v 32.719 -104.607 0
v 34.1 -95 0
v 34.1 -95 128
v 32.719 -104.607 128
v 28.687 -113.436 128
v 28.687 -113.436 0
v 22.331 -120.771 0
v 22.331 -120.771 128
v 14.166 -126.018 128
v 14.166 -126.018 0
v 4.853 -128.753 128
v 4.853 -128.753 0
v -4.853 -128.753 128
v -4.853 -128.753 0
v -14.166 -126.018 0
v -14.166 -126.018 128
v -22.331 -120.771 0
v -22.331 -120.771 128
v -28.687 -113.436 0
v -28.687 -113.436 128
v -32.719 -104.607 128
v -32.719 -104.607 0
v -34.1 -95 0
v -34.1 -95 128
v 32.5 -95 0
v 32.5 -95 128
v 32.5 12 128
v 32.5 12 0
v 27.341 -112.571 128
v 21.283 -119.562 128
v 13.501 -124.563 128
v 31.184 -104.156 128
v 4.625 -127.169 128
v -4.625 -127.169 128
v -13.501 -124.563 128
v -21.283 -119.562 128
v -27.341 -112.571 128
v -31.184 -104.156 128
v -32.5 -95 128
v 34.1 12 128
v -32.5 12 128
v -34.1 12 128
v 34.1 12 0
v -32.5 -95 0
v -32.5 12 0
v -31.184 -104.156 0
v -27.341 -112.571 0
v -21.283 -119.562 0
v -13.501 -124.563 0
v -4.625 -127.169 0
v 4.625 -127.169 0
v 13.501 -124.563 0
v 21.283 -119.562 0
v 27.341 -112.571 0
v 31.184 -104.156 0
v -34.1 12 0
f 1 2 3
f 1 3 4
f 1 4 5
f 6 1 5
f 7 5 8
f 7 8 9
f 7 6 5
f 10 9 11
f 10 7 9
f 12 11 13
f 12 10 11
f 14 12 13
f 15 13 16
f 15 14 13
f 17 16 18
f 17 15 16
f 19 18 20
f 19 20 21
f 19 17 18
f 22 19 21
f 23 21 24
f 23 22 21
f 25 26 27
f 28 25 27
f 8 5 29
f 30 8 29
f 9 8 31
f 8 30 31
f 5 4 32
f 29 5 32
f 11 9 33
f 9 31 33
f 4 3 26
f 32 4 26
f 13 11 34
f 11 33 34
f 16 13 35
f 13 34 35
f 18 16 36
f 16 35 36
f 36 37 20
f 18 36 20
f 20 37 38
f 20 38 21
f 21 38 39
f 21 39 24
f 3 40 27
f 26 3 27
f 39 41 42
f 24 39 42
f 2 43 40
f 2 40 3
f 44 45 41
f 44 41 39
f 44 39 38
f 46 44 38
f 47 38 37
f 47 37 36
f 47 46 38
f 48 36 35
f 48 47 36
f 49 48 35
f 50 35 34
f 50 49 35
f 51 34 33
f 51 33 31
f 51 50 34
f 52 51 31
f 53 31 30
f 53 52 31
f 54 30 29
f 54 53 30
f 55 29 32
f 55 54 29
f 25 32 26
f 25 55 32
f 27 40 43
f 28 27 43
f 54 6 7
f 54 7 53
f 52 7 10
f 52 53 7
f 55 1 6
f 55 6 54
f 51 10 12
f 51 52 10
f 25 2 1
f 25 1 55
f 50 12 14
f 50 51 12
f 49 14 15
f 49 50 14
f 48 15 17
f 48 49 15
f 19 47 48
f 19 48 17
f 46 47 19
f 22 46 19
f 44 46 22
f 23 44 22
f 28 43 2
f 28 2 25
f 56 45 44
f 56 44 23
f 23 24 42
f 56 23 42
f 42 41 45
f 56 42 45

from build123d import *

# Parameters (mm, degrees)
SKETCH1_R                = 14
BOSS_EXTRUDE1_DEPTH      = 6
M3_CLEARANCE_HOLE1_D     = 3.6
M3_CLEARANCE_HOLE1_DEPTH = 6
M3_CLEARANCE_HOLE1_TIP   = 1.081549114
FILLET1_R                = 15
SKETCH4_W                = 65
SKETCH4_H                = 9
CUT_EXTRUDE1_DEPTH       = 2
M4_CLEARANCE_HOLE1_D     = 4.8
M4_CLEARANCE_HOLE1_DEPTH = 6
M4_CLEARANCE_HOLE1_TIP   = 1.442065486
CHAMFER1_SIZE            = 2.4
BOSS_EXTRUDE2_DEPTH      = 128
SKETCH10_W               = 128
SKETCH10_H               = 68
CUT_EXTRUDE2_DEPTH       = 195.170157336


with BuildPart() as part:
    # Sketch1 → Boss-Extrude1 (new body)
    with BuildSketch(Plane.XY):
        with BuildLine():
            Line((-32.5, 95), (-32.5, -95))
            ThreePointArc((-32.5, -95), (0, -127.5), (32.5, -95))
            Line((32.5, -95), (32.5, 95))
            Line((32.5, 95), (-32.5, 95))
        make_face()
        with Locations((0, -95)):
            Circle(SKETCH1_R, mode=Mode.SUBTRACT)
    extrude(amount=BOSS_EXTRUDE1_DEPTH)

    # M3 Clearance Hole1
    with Locations(Plane(origin=(0, 0, 0), x_dir=(-1, 0, 0), z_dir=(0, 0, -1))):
        with Locations((-15.5, -110.5), (15.5, -110.5), (15.5, -79.5), (-15.5, -79.5)):
            Hole(M3_CLEARANCE_HOLE1_D / 2, depth=M3_CLEARANCE_HOLE1_DEPTH)
            with Locations((0, 0, -(M3_CLEARANCE_HOLE1_DEPTH + M3_CLEARANCE_HOLE1_TIP / 2))):  # 118° drill point
                Cone(0, M3_CLEARANCE_HOLE1_D / 2, M3_CLEARANCE_HOLE1_TIP, mode=Mode.SUBTRACT)

    # Fillet1
    fillet1_edges = [part.edges().sort_by_distance(p)[0] for p in [
        (-32.5, 95, 3),
        (32.5, 95, 3),
    ]]
    fillet(fillet1_edges, radius=FILLET1_R)

    # Sketch4 → Cut-Extrude1 (cut)
    with BuildSketch(Plane.XY.offset(6)):
        with Locations((0, -60.5)):
            Rectangle(SKETCH4_W, SKETCH4_H)
        with Locations((0, 7.5)):
            Rectangle(SKETCH4_W, SKETCH4_H)
        with Locations((0, 75.5)):
            Rectangle(SKETCH4_W, SKETCH4_H)
    extrude(amount=-CUT_EXTRUDE1_DEPTH, mode=Mode.SUBTRACT)

    # M4 Clearance Hole1
    with Locations(Plane.XY.offset(4)):
        with Locations((-24.5, -60.5), (-24.5, 75.5), (24.5, 75.5), (0, 75.5), (-24.5, 7.5), (0, 7.5), (24.5, 7.5), (24.5, -60.5), (0, -60.5)):
            Hole(M4_CLEARANCE_HOLE1_D / 2, depth=M4_CLEARANCE_HOLE1_DEPTH)
            with Locations((0, 0, -(M4_CLEARANCE_HOLE1_DEPTH + M4_CLEARANCE_HOLE1_TIP / 2))):  # 118° drill point
                Cone(0, M4_CLEARANCE_HOLE1_D / 2, M4_CLEARANCE_HOLE1_TIP, mode=Mode.SUBTRACT)

    # Chamfer1
    chamfer1_edges = [part.edges().sort_by_distance(p)[0] for p in [
        (13.7, -110.5, 0),
        (-17.3, -110.5, 0),
        (-17.3, -79.5, 0),
        (13.7, -79.5, 0),
        (-22.1, 75.5, 0),
        (2.4, 75.5, 0),
        (26.9, 75.5, 0),
        (26.9, 7.5, 0),
        (2.4, 7.5, 0),
        (-22.1, 7.5, 0),
        (-22.1, -60.5, 0),
        (2.4, -60.5, 0),
        (26.9, -60.5, 0),
    ]]
    chamfer(chamfer1_edges, length=CHAMFER1_SIZE)


with BuildPart() as body_2:
    # Sketch7 → Boss-Extrude2 (new body)
    with BuildSketch(Plane(origin=(0, 0, 0), x_dir=(-1, 0, 0), z_dir=(0, 0, -1))):
        with BuildLine():
            ThreePointArc((-34.1, -95), (0, -129.1), (34.1, -95))
            Line((34.1, -95), (34.1, 80))
            Line((34.1, 80), (32.5, 80))
            Line((32.5, 80), (32.5, -95))
            ThreePointArc((32.5, -95), (0, -127.5), (-32.5, -95))
            Line((-32.5, -95), (-32.5, 80))
            Line((-32.5, 80), (-34.1, 80))
            Line((-34.1, 80), (-34.1, -95))
        make_face()
    extrude(amount=-BOSS_EXTRUDE2_DEPTH)

    # Sketch10 → Cut-Extrude2 (cut, through all)
    with BuildSketch(Plane(origin=(34.1, 0, 0), x_dir=(0, 0, -1), z_dir=(1, 0, 0))):
        with Locations((-64, 46)):
            Rectangle(SKETCH10_W, SKETCH10_H)
    extrude(amount=-CUT_EXTRUDE2_DEPTH, mode=Mode.SUBTRACT)


solid = body_2.part
